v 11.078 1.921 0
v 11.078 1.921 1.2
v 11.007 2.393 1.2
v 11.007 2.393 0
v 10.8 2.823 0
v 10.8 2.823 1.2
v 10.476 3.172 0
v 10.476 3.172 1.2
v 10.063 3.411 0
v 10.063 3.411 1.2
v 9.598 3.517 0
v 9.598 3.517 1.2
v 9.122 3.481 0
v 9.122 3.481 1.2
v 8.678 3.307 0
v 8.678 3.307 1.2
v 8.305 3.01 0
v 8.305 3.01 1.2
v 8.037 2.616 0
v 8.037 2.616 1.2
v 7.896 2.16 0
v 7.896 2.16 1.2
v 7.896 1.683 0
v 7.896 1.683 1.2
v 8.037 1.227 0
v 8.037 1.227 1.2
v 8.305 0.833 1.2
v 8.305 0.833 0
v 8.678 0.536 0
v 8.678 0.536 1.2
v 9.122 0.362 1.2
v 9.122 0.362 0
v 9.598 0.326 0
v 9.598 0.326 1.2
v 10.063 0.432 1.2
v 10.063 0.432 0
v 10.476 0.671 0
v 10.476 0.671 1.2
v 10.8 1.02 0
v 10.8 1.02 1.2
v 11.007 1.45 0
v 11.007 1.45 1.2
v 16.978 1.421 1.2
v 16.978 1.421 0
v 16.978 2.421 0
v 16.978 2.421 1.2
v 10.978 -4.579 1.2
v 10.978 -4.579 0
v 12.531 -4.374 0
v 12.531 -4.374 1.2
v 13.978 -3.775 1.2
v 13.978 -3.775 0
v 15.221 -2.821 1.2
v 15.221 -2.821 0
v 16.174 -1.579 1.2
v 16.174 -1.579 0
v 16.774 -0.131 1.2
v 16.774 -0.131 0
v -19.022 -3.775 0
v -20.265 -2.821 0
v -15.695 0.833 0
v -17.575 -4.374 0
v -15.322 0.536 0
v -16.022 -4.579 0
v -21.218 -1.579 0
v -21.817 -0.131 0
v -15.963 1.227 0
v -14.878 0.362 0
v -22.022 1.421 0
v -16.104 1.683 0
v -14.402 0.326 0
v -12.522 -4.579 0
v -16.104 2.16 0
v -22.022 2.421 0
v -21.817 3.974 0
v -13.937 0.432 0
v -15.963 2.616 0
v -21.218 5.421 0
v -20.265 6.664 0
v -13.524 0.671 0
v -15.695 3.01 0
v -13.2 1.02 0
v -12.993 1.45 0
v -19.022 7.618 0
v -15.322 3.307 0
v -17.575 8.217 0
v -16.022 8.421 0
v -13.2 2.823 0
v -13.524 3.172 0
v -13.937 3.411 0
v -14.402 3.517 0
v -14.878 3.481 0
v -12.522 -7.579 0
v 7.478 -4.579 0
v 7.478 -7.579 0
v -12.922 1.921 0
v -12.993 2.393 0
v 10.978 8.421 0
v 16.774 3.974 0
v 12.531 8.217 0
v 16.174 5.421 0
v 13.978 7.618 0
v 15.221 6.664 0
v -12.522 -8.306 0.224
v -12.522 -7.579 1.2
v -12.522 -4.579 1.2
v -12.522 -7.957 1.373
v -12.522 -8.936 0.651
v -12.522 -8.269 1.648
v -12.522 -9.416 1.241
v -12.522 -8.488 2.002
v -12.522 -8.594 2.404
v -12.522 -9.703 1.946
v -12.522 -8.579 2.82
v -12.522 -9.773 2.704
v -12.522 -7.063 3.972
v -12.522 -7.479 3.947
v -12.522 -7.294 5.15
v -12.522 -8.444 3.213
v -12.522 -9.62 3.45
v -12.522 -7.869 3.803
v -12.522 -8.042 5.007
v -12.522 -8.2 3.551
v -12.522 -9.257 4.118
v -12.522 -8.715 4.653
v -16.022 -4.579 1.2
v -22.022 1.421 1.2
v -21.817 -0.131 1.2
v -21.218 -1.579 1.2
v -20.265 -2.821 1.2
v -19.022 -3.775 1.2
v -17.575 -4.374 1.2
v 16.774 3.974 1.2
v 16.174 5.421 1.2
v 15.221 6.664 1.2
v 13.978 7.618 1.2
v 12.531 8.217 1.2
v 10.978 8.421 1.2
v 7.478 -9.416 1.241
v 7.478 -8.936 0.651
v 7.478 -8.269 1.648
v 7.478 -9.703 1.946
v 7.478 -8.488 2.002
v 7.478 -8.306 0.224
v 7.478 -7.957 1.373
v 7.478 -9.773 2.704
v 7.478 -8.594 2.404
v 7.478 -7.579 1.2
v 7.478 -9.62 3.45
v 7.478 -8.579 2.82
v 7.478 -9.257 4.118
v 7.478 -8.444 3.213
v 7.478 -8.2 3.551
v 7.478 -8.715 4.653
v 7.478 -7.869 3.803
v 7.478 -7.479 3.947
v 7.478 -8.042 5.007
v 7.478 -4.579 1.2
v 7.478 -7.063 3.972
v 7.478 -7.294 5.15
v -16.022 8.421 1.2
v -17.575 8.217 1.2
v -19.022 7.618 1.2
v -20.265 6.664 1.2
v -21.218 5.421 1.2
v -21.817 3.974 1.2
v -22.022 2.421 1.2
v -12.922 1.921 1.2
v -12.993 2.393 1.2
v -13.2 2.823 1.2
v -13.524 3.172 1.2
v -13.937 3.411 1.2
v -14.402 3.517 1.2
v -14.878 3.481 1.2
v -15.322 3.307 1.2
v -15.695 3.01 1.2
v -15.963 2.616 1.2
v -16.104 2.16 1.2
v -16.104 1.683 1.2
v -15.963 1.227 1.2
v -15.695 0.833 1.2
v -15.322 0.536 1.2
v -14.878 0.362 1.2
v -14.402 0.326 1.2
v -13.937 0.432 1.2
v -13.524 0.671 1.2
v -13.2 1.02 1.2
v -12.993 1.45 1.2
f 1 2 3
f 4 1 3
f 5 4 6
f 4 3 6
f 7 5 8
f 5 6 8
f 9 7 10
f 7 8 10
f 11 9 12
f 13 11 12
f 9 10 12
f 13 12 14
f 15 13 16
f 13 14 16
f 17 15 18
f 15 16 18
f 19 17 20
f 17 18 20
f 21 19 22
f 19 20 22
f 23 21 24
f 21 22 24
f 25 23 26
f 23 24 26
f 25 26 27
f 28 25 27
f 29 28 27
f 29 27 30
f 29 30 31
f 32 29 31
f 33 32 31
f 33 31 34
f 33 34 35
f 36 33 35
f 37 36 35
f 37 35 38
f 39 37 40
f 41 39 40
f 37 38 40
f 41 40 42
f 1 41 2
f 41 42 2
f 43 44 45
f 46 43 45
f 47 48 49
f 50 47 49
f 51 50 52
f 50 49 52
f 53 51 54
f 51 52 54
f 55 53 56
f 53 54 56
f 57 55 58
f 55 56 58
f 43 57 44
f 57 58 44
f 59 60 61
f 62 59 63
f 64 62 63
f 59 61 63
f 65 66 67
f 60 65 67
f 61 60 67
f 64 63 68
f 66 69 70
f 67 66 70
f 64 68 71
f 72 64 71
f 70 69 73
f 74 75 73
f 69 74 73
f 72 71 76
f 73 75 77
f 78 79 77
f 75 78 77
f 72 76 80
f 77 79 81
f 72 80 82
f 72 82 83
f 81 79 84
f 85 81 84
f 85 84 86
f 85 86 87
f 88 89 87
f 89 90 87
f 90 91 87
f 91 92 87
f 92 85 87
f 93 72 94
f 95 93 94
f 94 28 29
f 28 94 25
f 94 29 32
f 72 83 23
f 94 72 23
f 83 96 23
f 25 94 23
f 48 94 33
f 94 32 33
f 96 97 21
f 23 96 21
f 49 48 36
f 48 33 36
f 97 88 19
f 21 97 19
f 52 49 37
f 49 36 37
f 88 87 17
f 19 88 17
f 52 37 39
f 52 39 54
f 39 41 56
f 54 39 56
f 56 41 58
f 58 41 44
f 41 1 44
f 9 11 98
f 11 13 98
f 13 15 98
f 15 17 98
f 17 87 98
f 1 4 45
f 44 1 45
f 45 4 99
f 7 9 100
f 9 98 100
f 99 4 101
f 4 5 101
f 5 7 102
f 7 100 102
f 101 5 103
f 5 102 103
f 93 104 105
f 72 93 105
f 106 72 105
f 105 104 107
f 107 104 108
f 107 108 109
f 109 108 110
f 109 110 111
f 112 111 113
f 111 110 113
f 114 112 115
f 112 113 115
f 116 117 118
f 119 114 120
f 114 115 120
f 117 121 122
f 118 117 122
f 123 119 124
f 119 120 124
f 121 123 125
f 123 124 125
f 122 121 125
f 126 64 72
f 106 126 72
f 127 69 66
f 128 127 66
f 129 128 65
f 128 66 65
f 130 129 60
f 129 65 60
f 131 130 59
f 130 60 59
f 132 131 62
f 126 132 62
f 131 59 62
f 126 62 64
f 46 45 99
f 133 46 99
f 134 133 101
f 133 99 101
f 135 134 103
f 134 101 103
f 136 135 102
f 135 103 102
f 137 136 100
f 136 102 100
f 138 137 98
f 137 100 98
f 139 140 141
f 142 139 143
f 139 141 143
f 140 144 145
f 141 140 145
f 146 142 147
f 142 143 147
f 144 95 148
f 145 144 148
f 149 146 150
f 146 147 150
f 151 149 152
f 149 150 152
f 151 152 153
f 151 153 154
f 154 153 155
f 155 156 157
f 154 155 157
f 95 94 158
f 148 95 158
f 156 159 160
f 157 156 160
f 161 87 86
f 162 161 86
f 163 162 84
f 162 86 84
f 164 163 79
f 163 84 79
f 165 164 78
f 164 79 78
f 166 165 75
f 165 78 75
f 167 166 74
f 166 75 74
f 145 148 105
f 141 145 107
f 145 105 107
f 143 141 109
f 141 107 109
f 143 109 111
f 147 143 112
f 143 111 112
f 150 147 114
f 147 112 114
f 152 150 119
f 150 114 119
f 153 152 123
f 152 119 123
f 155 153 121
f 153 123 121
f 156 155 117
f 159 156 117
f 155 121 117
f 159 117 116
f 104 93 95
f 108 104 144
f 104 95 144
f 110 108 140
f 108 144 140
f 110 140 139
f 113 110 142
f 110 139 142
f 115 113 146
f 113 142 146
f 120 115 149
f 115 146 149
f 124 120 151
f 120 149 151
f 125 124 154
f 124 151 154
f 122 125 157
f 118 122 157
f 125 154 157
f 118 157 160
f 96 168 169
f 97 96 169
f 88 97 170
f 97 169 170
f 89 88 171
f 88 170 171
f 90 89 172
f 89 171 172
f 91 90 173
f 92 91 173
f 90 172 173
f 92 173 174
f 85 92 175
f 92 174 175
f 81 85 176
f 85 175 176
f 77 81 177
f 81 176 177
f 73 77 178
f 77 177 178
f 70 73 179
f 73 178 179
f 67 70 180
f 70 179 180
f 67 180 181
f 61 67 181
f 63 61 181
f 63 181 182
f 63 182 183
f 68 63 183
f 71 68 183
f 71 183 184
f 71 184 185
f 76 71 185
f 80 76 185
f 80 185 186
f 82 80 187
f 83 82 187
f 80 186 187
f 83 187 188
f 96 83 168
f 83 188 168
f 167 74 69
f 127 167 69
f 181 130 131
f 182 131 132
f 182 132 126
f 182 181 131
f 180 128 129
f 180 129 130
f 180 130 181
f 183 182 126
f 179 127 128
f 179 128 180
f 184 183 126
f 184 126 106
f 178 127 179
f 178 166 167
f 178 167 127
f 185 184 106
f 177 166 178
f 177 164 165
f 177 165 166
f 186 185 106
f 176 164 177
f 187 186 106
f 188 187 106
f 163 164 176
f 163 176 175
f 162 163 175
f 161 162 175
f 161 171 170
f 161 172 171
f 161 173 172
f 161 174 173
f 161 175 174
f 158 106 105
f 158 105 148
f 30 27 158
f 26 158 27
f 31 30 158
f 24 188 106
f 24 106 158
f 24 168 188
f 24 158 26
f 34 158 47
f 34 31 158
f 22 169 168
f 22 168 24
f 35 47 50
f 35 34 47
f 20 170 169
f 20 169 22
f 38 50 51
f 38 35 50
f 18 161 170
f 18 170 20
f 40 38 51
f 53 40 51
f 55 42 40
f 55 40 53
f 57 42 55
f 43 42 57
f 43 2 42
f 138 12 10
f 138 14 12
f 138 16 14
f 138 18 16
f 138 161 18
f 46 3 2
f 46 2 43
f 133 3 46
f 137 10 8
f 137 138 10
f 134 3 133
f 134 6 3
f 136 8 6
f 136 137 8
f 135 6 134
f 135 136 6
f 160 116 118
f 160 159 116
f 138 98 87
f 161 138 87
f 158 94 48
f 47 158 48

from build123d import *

# Parameters (mm, degrees)
EXTRUDE_1_DEPTH     = 1.2
SKETCH_2_R          = 1.6
CUT_EXTRUDE_1_DEPTH = 1.2
SKETCH_4_W          = 20
SKETCH_4_H          = 1.2


with BuildPart() as part:
    # 草图1 → 凸台-拉伸1 (new body)
    with BuildSketch(Plane.XY):
        with BuildLine():
            Line((7.478060046, -4.57852194), (10.978060046, -4.57852194))
            ThreePointArc((10.978060046, -4.57852194), (15.220700733, -2.821162627), (16.978060046, 1.42147806))
            Line((16.978060046, 1.42147806), (16.978060046, 2.42147806))
            ThreePointArc((16.978060046, 2.42147806), (15.220700733, 6.664118747), (10.978060046, 8.42147806))
            Line((10.978060046, 8.42147806), (-16.021939954, 8.42147806))
            ThreePointArc((-16.021939954, 8.42147806), (-20.264580641, 6.664118747), (-22.021939954, 2.42147806))
            Line((-22.021939954, 2.42147806), (-22.021939954, 1.42147806))
            ThreePointArc((-22.021939954, 1.42147806), (-20.264580641, -2.821162627), (-16.021939954, -4.57852194))
            Line((-16.021939954, -4.57852194), (-12.521939954, -4.57852194))
            Line((-12.521939954, -4.57852194), (-12.521939954, -7.57852194))
            Line((-12.521939954, -7.57852194), (7.478060046, -7.57852194))
            Line((7.478060046, -7.57852194), (7.478060046, -4.57852194))
        make_face()
    extrude(amount=EXTRUDE_1_DEPTH)

    # 草图2 → 切除-拉伸1 (cut)
    with BuildSketch(Plane.XY.offset(1.2)):
        with Locations((-14.521939954, 1.92147806)):
            Circle(SKETCH_2_R)
        with Locations((9.478060046, 1.92147806)):
            Circle(SKETCH_2_R)
    extrude(amount=-CUT_EXTRUDE_1_DEPTH, mode=Mode.SUBTRACT)

    # 扫描1: sweep along a path in 草图3
    with BuildLine(Plane.ZY.offset(12.521939954)) as sweep_1_path:
        ThreePointArc((0.6, -7.57852194), (2.762027547, -9.176177297), (4.561146836, -7.178669966))
    # 草图4 → 扫描1 (sweep)
    with BuildSketch(Plane.XZ.offset(7.57852194)):
        with Locations((-2.521939954, 0.6)):
            Rectangle(SKETCH_4_W, SKETCH_4_H)
    sweep(path=sweep_1_path.line)


solid = part.part
